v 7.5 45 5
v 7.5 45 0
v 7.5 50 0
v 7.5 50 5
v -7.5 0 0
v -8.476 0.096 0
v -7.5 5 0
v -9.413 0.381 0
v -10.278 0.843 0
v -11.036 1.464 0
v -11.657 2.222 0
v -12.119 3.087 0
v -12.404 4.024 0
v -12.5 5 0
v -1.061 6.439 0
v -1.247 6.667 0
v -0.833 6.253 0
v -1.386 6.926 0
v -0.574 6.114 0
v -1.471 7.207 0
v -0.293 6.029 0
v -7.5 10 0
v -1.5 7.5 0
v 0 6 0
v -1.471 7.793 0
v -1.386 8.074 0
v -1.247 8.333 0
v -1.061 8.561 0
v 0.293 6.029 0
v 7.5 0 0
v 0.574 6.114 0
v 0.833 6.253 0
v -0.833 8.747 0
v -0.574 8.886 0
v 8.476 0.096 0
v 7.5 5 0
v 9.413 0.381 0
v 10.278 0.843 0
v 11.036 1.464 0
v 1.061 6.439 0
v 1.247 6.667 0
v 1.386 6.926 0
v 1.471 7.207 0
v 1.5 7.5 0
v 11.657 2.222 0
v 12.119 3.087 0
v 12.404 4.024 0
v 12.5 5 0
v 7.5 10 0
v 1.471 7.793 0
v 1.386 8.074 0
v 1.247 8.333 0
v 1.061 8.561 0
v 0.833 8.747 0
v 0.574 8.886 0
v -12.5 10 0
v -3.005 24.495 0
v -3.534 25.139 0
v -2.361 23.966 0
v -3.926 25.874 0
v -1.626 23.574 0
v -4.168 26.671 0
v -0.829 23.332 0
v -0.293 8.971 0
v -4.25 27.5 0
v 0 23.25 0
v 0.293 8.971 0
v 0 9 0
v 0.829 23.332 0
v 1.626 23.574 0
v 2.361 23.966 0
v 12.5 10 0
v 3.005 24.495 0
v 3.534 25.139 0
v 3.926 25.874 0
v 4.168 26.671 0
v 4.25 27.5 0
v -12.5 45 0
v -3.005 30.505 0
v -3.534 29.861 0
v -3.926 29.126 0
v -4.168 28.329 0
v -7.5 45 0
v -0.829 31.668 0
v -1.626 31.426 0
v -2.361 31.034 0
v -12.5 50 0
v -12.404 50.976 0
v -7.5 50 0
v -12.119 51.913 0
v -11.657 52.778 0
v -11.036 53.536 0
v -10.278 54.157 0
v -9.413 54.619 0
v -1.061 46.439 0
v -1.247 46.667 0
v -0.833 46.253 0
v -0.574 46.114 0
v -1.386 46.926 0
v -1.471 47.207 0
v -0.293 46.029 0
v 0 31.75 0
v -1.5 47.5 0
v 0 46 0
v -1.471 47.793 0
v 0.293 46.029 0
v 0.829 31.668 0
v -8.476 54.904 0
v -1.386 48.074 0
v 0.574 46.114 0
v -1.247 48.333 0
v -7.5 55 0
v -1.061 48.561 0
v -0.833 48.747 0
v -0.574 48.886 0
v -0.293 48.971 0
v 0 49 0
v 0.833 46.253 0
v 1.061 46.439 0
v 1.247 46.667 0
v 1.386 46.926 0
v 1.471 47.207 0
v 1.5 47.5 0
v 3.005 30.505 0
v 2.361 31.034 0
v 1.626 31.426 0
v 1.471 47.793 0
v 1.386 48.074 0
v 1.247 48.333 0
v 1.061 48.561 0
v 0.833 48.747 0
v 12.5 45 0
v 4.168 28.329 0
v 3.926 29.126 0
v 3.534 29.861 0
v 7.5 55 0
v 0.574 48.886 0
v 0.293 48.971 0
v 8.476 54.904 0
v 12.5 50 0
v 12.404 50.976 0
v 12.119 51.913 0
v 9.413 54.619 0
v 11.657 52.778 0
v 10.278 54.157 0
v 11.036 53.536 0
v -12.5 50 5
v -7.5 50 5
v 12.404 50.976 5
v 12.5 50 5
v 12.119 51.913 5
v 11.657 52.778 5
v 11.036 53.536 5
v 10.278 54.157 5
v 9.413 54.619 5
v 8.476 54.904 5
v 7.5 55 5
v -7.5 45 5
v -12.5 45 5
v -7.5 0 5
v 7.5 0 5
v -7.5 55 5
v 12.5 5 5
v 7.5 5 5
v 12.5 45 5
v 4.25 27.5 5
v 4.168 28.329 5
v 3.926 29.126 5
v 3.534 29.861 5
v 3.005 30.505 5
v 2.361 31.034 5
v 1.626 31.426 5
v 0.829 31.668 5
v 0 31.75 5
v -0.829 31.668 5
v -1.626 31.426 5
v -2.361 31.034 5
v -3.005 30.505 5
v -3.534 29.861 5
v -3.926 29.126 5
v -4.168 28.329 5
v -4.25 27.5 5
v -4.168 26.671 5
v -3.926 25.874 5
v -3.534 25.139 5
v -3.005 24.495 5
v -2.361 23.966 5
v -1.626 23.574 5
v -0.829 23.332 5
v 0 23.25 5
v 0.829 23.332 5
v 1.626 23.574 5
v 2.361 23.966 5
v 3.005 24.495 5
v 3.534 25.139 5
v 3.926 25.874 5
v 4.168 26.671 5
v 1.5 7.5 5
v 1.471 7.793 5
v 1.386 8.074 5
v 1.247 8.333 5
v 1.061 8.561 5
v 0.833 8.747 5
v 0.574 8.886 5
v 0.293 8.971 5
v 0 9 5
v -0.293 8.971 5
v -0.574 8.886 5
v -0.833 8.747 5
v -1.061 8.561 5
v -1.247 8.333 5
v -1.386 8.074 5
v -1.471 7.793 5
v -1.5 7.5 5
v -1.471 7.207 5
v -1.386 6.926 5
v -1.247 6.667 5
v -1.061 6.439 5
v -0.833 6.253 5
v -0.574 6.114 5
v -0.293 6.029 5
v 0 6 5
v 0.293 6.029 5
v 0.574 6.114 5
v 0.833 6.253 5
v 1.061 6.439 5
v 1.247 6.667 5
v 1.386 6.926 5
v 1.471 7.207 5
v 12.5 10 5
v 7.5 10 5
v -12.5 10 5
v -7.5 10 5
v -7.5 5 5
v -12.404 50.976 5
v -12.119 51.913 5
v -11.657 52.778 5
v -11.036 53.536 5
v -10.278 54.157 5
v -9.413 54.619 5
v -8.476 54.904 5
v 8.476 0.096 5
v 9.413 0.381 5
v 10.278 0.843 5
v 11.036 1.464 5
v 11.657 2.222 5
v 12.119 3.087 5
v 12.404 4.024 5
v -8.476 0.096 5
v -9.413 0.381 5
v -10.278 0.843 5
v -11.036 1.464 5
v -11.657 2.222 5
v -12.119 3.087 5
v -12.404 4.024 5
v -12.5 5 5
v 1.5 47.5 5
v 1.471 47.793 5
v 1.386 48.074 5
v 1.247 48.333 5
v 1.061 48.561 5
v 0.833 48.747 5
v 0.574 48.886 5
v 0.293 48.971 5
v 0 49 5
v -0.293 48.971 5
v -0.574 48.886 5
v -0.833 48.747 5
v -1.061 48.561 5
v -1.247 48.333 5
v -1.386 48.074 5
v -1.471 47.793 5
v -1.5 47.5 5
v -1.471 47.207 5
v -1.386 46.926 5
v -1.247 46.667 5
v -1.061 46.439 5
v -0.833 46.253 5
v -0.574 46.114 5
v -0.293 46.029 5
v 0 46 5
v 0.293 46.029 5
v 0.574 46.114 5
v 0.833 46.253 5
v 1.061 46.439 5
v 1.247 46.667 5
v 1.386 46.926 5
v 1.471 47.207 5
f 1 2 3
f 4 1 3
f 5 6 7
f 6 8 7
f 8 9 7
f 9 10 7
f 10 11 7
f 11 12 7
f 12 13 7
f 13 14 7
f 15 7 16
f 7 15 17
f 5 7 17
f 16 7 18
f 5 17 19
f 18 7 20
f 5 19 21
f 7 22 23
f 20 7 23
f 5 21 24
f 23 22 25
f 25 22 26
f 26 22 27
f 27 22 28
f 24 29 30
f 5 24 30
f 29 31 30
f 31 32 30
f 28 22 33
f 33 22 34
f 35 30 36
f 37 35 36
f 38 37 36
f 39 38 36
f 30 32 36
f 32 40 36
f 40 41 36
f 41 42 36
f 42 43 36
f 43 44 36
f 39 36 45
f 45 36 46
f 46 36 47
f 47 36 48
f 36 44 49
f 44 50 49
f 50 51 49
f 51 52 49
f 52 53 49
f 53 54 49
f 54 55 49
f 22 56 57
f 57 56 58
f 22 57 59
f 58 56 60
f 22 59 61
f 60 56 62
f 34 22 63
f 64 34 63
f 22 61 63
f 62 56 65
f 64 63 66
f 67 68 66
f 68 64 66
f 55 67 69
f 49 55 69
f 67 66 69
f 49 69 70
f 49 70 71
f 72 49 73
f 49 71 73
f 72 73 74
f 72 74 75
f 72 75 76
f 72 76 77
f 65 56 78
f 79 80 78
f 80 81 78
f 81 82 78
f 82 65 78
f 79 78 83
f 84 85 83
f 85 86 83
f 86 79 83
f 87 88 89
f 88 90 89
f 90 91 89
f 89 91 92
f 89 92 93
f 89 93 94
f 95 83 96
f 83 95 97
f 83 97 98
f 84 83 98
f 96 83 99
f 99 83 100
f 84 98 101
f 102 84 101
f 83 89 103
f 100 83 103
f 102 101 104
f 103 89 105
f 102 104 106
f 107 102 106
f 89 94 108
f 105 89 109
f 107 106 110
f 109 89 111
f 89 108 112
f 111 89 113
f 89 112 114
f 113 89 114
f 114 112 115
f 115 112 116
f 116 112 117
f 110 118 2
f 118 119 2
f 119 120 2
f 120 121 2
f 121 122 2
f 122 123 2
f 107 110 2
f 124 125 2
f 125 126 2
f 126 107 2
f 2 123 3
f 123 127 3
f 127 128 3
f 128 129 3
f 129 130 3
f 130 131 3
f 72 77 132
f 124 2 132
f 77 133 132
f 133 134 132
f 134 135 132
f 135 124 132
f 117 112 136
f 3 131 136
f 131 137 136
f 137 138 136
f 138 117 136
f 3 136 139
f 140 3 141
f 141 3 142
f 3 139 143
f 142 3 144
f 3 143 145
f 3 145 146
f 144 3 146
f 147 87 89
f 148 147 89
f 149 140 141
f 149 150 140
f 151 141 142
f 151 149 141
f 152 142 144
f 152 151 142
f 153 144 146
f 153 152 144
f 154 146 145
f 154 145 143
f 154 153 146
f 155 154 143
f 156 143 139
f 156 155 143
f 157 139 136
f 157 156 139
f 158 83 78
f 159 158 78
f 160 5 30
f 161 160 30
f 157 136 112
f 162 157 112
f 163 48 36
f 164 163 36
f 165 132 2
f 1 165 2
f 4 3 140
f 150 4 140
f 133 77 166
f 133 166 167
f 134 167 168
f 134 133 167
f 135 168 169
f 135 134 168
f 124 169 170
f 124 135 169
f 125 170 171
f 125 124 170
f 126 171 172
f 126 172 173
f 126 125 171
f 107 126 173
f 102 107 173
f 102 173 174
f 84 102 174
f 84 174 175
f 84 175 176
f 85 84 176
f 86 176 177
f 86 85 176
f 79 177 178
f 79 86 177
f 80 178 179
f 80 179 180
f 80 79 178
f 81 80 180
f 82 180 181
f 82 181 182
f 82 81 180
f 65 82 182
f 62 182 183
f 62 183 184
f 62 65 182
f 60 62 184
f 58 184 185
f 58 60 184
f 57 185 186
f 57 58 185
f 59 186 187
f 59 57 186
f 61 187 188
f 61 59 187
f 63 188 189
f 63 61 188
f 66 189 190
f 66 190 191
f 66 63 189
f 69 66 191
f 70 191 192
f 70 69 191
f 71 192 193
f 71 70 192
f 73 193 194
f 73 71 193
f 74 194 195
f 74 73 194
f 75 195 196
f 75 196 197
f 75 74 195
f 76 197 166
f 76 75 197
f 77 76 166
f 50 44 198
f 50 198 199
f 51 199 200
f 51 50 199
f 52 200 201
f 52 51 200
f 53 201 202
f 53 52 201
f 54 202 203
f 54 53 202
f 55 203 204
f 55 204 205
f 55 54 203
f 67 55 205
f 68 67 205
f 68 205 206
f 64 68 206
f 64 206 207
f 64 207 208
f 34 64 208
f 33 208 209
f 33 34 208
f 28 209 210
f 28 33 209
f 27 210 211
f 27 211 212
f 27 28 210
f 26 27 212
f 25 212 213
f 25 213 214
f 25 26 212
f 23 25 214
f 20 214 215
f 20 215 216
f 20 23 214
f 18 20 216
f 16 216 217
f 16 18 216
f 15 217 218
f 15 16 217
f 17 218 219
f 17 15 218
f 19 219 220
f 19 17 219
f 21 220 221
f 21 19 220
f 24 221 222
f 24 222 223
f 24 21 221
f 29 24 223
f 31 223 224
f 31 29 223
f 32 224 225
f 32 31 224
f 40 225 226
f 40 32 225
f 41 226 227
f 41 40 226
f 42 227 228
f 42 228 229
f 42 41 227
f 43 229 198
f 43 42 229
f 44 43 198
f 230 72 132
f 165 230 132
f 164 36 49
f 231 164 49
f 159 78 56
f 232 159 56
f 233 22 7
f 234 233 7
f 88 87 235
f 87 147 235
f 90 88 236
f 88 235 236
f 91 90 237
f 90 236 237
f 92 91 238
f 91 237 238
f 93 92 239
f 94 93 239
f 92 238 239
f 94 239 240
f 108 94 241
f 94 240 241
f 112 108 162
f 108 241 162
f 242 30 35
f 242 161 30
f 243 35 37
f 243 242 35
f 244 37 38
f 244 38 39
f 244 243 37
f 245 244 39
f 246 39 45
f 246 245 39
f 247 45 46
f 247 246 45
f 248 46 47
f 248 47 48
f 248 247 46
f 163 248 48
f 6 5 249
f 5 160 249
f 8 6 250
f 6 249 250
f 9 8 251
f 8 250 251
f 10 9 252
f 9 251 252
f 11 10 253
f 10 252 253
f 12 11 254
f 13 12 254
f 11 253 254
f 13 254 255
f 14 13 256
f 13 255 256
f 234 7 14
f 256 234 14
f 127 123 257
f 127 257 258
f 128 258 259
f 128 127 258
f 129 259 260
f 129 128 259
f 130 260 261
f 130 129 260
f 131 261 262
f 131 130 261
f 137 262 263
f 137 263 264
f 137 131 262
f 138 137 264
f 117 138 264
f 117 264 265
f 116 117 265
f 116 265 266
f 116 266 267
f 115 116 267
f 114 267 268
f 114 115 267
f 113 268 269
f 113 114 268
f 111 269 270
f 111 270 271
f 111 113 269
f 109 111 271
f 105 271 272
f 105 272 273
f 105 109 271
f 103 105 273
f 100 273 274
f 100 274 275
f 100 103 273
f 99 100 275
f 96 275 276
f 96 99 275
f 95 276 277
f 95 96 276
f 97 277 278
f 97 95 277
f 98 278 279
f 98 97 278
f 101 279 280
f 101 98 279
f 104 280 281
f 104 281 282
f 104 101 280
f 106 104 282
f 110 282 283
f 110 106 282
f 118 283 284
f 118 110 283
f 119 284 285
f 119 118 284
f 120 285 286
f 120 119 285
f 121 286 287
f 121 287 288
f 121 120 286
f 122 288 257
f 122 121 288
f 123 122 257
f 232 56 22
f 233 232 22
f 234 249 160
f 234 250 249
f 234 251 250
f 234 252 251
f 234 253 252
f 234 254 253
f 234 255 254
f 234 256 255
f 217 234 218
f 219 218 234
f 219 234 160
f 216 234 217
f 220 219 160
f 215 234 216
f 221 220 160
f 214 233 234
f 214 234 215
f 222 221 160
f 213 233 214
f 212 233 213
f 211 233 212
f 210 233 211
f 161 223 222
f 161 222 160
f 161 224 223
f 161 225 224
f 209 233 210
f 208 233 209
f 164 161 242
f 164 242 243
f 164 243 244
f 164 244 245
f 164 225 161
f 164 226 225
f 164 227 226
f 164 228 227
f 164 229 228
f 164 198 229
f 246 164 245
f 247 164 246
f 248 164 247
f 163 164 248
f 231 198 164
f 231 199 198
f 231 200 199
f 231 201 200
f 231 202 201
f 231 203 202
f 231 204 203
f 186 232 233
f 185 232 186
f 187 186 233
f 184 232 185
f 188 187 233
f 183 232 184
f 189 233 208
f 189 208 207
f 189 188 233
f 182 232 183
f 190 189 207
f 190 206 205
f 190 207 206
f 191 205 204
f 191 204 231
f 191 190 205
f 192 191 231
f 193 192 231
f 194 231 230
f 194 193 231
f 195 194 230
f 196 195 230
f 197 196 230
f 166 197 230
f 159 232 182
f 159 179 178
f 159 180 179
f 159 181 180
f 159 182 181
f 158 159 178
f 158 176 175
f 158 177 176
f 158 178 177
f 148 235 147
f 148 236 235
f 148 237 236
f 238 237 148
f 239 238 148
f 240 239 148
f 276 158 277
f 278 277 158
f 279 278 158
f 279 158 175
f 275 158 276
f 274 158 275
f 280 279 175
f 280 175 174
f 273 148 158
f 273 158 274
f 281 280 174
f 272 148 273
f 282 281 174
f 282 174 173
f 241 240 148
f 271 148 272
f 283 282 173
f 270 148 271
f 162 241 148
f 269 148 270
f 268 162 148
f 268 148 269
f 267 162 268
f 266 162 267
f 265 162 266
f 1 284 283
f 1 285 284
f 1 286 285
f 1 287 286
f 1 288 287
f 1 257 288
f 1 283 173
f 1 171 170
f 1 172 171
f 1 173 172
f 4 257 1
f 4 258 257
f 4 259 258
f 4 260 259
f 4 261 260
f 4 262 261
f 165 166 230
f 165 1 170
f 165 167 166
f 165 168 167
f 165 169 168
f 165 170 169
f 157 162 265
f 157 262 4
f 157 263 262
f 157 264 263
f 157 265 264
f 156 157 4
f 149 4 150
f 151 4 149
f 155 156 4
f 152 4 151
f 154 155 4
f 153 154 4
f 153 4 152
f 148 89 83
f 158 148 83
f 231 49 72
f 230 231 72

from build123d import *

# Parameters (mm, degrees)
ESQUISSE1_R        = 1.5
ESQUISSE1_R_2      = 4.25
BOSS_EXTRU_1_DEPTH = 5
CONG_1_R           = 5


with BuildPart() as part:
    # Esquisse1 → Boss.-Extru.1 (new body)
    with BuildSketch(Plane.XY):
        Polygon((-12.5, 0), (12.5, 0), (12.5, 5), (7.5, 5), (7.5, 10), (12.5, 10), (12.5, 45), (7.5, 45), (7.5, 50), (12.5, 50), (12.5, 55), (-12.5, 55), (-12.5, 50), (-7.5, 50), (-7.5, 45), (-12.5, 45), (-12.5, 10), (-7.5, 10), (-7.5, 5), (-12.5, 5), align=None)
        with Locations((0, 47.5)):
            Circle(ESQUISSE1_R, mode=Mode.SUBTRACT)
        with Locations((0, 7.5)):
            Circle(ESQUISSE1_R, mode=Mode.SUBTRACT)
        with Locations((0, 27.5)):
            Circle(ESQUISSE1_R_2, mode=Mode.SUBTRACT)
    extrude(amount=BOSS_EXTRU_1_DEPTH)

    # Congé1
    cong_1_edges = [part.edges().sort_by_distance(p)[0] for p in [
        (12.5, 55, 2.5),
        (12.5, 0, 2.5),
        (-12.5, 0, 2.5),
        (-12.5, 55, 2.5),
    ]]
    fillet(cong_1_edges, radius=CONG_1_R - 0.0001)  # a hair under: the kernel refuses the full size


solid = part.part
